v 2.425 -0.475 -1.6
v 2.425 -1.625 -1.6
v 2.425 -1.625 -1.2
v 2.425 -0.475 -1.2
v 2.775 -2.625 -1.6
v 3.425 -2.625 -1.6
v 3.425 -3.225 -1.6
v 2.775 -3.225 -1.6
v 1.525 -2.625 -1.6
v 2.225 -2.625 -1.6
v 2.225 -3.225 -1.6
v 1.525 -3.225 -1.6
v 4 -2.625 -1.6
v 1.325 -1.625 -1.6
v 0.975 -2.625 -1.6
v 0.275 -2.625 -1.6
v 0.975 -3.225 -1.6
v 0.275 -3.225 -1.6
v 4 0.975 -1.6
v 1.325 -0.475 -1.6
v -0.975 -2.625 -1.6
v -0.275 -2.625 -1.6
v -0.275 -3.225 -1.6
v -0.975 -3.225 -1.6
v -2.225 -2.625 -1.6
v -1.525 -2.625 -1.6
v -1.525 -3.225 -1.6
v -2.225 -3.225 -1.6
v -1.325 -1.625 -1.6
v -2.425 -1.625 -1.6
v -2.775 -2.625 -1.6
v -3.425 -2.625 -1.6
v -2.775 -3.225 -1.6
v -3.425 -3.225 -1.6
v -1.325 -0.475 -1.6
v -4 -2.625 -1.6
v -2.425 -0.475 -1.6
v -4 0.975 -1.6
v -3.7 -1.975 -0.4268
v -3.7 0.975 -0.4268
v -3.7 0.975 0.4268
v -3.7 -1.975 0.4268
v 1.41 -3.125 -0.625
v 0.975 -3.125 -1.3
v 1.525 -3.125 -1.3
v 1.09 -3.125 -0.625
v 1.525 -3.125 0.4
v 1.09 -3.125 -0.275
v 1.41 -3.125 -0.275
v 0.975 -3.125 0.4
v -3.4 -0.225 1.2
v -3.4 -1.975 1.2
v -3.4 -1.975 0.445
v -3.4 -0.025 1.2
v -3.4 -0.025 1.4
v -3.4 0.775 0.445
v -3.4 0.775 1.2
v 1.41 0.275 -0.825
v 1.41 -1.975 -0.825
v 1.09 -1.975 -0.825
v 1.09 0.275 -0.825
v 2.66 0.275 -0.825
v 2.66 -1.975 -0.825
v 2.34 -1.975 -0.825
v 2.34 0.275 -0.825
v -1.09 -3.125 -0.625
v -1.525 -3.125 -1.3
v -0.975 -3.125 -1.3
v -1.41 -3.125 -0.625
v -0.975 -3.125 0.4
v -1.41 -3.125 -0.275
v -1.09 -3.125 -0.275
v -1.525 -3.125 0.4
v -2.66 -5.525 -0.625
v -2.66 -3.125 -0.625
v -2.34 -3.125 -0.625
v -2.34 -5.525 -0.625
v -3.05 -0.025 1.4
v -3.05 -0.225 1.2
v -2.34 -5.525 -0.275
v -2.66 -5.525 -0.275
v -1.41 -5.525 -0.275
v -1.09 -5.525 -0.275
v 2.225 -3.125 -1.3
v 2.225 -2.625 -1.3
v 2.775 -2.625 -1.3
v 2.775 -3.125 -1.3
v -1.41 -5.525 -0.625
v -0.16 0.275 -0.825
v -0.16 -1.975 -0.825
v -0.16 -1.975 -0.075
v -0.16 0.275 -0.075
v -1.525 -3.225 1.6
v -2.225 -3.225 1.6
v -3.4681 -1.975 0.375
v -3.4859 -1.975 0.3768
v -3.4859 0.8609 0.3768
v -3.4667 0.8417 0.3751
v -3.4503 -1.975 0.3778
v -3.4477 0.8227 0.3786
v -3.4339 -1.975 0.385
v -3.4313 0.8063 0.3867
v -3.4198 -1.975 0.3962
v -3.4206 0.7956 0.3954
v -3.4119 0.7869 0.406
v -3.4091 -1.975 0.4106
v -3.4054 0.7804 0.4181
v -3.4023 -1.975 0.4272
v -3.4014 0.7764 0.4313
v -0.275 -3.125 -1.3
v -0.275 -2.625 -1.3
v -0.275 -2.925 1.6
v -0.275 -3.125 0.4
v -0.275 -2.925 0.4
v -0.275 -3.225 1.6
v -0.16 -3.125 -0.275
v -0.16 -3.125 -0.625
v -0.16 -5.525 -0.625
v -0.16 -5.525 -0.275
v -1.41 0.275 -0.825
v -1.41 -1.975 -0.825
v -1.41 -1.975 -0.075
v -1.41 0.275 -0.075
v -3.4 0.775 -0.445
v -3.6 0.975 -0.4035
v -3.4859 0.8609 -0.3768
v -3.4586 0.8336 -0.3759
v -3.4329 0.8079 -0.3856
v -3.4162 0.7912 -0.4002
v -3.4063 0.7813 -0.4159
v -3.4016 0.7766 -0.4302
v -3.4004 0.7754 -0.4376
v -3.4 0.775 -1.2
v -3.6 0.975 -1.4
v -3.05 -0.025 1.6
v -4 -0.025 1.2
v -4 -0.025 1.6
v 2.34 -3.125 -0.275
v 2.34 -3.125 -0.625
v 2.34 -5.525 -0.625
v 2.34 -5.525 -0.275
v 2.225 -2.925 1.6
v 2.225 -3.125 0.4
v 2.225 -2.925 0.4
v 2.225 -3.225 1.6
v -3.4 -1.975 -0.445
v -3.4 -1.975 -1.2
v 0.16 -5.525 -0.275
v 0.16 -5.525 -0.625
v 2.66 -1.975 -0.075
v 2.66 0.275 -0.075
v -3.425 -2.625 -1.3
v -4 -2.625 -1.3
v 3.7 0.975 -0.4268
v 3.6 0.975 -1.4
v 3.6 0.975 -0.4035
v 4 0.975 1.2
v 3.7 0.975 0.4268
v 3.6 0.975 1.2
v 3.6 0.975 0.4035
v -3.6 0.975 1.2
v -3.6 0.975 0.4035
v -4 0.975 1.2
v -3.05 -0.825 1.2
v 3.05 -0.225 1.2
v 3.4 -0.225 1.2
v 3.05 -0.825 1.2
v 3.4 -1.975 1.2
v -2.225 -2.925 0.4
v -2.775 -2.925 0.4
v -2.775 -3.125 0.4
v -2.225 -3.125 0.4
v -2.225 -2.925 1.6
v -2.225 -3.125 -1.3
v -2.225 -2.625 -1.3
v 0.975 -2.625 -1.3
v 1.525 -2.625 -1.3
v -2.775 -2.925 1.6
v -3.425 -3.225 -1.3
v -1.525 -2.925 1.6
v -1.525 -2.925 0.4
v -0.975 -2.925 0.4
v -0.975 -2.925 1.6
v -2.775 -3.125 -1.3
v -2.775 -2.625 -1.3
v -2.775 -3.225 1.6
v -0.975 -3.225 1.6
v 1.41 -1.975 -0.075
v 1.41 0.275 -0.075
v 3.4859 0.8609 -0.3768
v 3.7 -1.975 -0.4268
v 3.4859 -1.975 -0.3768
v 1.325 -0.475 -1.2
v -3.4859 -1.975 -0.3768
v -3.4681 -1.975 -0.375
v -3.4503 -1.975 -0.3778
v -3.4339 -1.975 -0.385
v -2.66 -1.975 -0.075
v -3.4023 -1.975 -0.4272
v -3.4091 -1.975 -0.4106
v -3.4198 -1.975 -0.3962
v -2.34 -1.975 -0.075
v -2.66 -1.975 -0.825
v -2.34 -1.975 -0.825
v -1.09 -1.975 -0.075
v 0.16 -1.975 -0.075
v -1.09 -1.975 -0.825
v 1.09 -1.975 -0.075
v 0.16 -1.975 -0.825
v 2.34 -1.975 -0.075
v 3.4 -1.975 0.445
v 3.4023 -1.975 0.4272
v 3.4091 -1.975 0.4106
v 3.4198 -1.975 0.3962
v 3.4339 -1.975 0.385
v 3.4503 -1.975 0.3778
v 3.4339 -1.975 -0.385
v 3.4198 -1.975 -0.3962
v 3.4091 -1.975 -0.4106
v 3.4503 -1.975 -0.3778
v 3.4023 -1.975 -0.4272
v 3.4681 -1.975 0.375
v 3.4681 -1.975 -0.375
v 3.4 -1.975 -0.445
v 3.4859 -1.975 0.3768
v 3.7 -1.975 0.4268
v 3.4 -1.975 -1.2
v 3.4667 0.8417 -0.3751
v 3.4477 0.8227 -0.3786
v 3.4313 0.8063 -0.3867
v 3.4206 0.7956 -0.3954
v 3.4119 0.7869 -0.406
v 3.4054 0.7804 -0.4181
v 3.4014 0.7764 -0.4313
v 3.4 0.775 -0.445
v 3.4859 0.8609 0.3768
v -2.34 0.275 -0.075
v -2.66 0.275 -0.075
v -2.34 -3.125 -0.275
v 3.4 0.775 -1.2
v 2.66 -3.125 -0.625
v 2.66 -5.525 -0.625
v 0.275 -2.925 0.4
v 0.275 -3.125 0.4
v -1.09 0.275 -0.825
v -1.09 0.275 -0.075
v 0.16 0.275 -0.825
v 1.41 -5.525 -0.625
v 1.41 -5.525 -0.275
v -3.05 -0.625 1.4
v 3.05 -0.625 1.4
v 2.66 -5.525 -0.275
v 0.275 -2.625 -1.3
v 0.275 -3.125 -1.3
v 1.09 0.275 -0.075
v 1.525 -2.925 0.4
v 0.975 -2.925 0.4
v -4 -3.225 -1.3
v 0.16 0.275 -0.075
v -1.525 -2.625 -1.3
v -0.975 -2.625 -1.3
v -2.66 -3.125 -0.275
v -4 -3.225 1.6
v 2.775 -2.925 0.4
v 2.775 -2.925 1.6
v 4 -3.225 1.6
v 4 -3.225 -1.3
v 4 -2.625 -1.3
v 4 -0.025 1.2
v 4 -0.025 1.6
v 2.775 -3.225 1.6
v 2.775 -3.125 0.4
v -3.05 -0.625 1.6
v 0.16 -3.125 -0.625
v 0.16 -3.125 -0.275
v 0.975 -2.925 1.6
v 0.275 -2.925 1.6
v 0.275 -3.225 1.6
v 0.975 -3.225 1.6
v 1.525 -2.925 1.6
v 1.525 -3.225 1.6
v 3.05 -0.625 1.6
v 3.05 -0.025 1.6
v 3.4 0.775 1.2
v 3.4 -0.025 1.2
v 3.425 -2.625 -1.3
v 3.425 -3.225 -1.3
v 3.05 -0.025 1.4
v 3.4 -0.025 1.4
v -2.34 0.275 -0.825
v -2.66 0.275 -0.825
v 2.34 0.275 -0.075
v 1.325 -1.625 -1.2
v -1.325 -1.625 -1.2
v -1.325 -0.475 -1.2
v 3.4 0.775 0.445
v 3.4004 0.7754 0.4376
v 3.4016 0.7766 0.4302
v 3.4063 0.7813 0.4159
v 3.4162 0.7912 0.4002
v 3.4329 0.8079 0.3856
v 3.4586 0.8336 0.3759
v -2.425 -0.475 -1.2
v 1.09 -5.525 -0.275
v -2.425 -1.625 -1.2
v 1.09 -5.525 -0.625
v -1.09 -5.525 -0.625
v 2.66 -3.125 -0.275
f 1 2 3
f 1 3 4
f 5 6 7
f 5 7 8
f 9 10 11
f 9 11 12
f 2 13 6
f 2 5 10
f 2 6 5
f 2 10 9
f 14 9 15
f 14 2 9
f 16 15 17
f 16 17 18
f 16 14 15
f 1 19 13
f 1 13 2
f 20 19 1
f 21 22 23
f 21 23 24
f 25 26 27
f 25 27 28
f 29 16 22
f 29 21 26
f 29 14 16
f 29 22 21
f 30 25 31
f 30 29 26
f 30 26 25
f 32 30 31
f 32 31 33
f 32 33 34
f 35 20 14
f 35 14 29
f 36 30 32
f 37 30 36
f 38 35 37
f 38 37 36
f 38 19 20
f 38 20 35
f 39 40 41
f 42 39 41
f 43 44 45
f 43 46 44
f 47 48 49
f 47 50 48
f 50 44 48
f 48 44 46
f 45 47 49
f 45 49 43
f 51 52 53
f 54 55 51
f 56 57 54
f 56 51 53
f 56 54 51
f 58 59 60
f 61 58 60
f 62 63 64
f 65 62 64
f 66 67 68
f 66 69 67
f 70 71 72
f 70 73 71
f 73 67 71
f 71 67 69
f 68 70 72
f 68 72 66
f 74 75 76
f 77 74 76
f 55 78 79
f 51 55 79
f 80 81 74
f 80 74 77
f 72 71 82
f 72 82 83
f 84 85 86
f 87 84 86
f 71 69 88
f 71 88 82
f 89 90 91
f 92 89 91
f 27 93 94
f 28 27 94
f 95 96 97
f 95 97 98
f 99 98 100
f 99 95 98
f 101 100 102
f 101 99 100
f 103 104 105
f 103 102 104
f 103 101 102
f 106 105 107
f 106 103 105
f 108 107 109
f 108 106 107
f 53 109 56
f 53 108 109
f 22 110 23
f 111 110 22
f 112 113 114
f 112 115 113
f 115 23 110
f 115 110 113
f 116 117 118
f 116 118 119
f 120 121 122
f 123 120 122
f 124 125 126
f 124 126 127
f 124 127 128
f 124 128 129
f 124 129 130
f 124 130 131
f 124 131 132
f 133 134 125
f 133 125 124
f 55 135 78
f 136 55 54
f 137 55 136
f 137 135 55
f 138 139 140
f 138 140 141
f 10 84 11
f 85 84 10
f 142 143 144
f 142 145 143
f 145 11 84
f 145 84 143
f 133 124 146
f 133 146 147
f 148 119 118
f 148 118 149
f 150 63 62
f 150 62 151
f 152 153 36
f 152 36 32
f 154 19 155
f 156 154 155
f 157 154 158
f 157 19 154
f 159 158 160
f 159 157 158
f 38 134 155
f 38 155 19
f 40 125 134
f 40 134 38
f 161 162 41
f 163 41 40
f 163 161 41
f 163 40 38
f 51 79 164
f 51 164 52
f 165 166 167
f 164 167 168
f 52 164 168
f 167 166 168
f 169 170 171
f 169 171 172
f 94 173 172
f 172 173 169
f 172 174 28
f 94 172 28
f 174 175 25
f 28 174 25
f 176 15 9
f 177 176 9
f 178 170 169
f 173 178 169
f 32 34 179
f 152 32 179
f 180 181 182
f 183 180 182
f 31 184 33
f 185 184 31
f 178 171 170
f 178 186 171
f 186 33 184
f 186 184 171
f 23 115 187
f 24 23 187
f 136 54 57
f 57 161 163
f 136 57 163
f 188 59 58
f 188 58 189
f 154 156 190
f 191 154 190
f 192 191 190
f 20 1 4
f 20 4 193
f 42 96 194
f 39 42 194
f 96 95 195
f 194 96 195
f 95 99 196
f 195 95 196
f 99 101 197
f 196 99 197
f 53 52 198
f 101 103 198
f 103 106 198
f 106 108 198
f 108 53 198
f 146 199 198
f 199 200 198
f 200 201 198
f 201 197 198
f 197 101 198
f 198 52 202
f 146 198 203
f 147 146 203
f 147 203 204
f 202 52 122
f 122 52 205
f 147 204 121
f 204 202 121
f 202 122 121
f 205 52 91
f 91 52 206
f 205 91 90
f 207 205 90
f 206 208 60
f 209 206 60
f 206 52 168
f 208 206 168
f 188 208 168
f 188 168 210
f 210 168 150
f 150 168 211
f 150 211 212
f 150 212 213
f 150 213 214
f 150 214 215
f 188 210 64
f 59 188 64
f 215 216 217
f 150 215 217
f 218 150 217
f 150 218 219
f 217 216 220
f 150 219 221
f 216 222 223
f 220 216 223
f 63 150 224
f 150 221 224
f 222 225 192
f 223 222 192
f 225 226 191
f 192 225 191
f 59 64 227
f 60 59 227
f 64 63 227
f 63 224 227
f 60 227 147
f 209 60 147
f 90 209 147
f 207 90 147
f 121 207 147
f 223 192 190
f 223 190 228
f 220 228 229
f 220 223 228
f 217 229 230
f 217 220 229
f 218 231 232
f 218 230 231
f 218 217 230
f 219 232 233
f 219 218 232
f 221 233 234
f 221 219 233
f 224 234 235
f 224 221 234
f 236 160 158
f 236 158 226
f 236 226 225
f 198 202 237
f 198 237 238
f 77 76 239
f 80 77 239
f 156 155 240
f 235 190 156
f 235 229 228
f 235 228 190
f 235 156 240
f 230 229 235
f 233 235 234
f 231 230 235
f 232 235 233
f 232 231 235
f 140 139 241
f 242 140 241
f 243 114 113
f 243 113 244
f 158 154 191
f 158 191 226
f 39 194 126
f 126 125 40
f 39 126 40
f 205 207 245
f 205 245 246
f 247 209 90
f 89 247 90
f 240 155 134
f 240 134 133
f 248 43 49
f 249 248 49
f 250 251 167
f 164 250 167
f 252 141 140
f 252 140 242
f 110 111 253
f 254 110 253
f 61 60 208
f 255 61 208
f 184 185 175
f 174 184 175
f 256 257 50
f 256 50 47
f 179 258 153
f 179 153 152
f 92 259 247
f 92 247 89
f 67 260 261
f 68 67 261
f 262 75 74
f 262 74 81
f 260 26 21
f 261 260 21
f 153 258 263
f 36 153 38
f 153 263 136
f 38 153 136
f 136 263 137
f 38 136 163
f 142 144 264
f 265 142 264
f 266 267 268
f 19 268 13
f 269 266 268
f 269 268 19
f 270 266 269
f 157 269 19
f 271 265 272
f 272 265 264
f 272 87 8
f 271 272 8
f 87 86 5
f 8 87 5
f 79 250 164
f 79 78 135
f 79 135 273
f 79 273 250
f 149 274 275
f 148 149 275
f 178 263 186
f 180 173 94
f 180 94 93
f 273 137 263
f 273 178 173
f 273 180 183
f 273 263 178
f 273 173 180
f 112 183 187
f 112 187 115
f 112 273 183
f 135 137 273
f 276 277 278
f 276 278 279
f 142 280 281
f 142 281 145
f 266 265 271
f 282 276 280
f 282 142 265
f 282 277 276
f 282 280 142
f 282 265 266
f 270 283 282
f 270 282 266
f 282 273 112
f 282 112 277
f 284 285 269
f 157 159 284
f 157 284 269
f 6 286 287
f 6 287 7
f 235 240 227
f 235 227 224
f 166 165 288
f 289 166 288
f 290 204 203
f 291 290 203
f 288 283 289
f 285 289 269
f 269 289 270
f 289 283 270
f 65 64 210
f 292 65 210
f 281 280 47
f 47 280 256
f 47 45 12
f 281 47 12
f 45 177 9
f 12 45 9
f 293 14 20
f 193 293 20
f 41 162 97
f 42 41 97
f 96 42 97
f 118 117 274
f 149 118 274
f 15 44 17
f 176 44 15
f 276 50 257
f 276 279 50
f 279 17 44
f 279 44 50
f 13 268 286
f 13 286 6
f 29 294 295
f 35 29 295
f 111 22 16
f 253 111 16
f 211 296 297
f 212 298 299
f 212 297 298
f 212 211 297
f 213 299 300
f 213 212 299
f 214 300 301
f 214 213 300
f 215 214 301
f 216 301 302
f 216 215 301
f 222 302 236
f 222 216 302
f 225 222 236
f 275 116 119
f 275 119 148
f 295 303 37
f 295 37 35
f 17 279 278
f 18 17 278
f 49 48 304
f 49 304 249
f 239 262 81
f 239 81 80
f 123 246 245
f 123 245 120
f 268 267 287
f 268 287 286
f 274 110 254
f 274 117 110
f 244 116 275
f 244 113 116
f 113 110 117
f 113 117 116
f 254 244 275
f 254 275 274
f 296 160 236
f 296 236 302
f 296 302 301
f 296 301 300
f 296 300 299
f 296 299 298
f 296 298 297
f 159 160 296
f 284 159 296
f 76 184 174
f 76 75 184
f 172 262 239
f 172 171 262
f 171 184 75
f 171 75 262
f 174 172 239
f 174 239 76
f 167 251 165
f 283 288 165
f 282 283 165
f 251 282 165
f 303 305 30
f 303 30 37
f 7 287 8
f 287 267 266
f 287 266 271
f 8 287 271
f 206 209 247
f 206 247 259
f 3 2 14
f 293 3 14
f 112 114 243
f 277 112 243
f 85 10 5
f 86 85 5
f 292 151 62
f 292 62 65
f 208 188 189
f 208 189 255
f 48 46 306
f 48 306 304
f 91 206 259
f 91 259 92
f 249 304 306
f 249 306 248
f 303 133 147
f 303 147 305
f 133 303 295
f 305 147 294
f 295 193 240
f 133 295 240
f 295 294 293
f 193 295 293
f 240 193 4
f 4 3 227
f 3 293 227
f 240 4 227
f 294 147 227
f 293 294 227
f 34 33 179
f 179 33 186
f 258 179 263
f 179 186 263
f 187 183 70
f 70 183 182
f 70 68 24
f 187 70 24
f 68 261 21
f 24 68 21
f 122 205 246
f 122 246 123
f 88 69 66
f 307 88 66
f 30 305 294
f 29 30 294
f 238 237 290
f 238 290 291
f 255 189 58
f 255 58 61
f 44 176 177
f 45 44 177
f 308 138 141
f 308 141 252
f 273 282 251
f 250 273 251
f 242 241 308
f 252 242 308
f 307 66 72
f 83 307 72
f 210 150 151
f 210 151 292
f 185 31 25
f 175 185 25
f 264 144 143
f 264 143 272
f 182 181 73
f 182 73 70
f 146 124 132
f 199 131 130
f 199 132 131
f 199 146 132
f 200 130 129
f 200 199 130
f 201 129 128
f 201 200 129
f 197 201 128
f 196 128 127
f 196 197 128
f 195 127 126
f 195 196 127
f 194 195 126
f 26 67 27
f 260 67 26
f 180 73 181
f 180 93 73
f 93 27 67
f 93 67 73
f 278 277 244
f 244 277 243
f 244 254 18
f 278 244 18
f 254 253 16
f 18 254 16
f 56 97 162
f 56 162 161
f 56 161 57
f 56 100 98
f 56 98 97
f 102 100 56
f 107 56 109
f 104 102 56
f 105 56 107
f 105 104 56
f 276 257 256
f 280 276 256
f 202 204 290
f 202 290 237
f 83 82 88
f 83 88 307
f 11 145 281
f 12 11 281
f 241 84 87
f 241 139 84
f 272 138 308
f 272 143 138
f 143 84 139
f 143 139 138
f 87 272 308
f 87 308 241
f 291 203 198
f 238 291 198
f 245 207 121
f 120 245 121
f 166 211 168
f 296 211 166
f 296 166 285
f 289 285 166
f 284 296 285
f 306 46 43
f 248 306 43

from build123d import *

# Parameters (mm, degrees)
SKETCH1_W            = 8
SKETCH1_H            = 4.2
BOSS_EXTRUDE1_DEPTH  = 2.8
CUT_EXTRUDE1_DEPTH   = 6.1
SKETCH3_W            = 0.95
SKETCH3_H            = 1
CUT_EXTRUDE2_DEPTH   = 0.4
CUT_EXTRUDE3_DEPTH   = 1
CUT_EXTRUDE4_DEPTH   = 0.35
CUT_EXTRUDE5_DEPTH   = 0.35
SKETCH7_W            = 8
SKETCH7_H            = 4.2
BOSS_EXTRUDE2_DEPTH  = 0.4
SKETCH8_W            = 0.55
SKETCH8_H            = 0.1
CUT_EXTRUDE6_DEPTH   = 3.2
CUT_EXTRUDE7_REACH   = 7.811
SKETCH10_W           = 0.55
SKETCH10_H           = 1.2
SKETCH11_W           = 0.55
SKETCH11_H           = 0.1
CUT_EXTRUDE8_DEPTH   = 3.2
CUT_EXTRUDE9_REACH   = 7.811
SKETCH13_W           = 0.55
SKETCH13_H           = 1.2
SKETCH14_W           = 0.55
SKETCH14_H           = 0.1
CUT_EXTRUDE10_DEPTH  = 3.2
CUT_EXTRUDE11_REACH  = 7.811
SKETCH16_W           = 0.55
SKETCH16_H           = 1.2
SKETCH17_W           = 0.55
SKETCH17_H           = 0.1
CUT_EXTRUDE12_DEPTH  = 3.2
CUT_EXTRUDE13_REACH  = 7.811
SKETCH19_W           = 0.55
SKETCH19_H           = 1.2
SKETCH20_W           = 0.55
SKETCH20_H           = 0.1
CUT_EXTRUDE14_DEPTH  = 3.2
CUT_EXTRUDE15_REACH  = 7.811
SKETCH22_W           = 0.55
SKETCH22_H           = 1.2
CUT_EXTRUDE16_REACH  = 7.614
SKETCH24_W           = 0.55
SKETCH24_H           = 0.3
CUT_EXTRUDE17_REACH  = 7.614
SKETCH26_W           = 0.55
SKETCH26_H           = 0.3
CUT_EXTRUDE18_REACH  = 7.614
SKETCH28_W           = 0.55
SKETCH28_H           = 0.3
CUT_EXTRUDE19_REACH  = 7.614
SKETCH30_W           = 0.55
SKETCH30_H           = 0.3
CUT_EXTRUDE20_REACH  = 7.614
SKETCH32_W           = 0.55
SKETCH32_H           = 0.3
CUT_EXTRUDE21_DEPTH  = 2.95
SKETCH34_W           = 0.3
SKETCH34_H           = 0.853669018
CUT_EXTRUDE22_DEPTH  = 2.95
SKETCH35_W           = 1.1
SKETCH35_H           = 1.15
CUT_EXTRUDE23_DEPTH  = 6.85154894
CUT_EXTRUDE24_REACH  = 8.053
SKETCH36_W           = 1.1
SKETCH36_H           = 1.15
SKETCH37_W           = 0.575
SKETCH37_H           = 0.3
CUT_EXTRUDE25_DEPTH  = 0.6
SKETCH38_W           = 0.3
SKETCH38_H           = 0.6
CUT_EXTRUDE26_DEPTH  = 0.575
SKETCH39_W           = 0.32
SKETCH39_H           = 0.35
BOSS_EXTRUDE3_DEPTH  = 2.4
SKETCH40_W           = 0.32
SKETCH40_H           = 0.35
BOSS_EXTRUDE4_DEPTH  = 2.4
SKETCH41_W           = 0.32
SKETCH41_H           = 0.35
BOSS_EXTRUDE5_DEPTH  = 2.4
SKETCH42_W           = 0.32
SKETCH42_H           = 0.35
BOSS_EXTRUDE6_DEPTH  = 2.4
SKETCH43_W           = 0.32
SKETCH43_H           = 0.35
BOSS_EXTRUDE7_DEPTH  = 2.4
SKETCH44_W           = 0.32
SKETCH44_H           = 0.75
BOSS_EXTRUDE8_DEPTH  = 2.25
SKETCH45_W           = 0.32
SKETCH45_H           = 0.75
BOSS_EXTRUDE9_DEPTH  = 2.25
SKETCH46_W           = 0.32
SKETCH46_H           = 0.75
BOSS_EXTRUDE10_DEPTH = 2.25
SKETCH47_W           = 0.32
SKETCH47_H           = 0.75
BOSS_EXTRUDE11_DEPTH = 2.25
SKETCH48_W           = 0.32
SKETCH48_H           = 0.75
BOSS_EXTRUDE12_DEPTH = 2.25
DRAFT1_ANGLE         = -13.146241157
DRAFT2_ANGLE         = -13.146241157
FILLET1_R            = 0.07
CHAMFER1_SIZE        = 0.2


with BuildPart() as part:
    # Sketch1 → Boss-Extrude1 (new body)
    with BuildSketch(Plane.XY.offset(1.6)):
        with Locations((0, -1.125)):
            Rectangle(SKETCH1_W, SKETCH1_H)
    extrude(amount=-BOSS_EXTRUDE1_DEPTH)

    # Sketch2 → Cut-Extrude1 (cut)
    with BuildSketch(Plane(origin=(3.05, 0, 0), x_dir=(0, 0, -1), z_dir=(1, 0, 0))):
        Polygon((1.2, 0.975), (-1.6, 0.975), (-1.6, -0.625), (-1.4, -0.625), (-1.2, -0.825), (-1.2, -1.975), (1.2, -1.975), align=None)
    extrude(amount=-CUT_EXTRUDE1_DEPTH, mode=Mode.SUBTRACT)

    # Sketch3 → Cut-Extrude2 (cut)
    with BuildSketch(Plane.XY.offset(1.6)):
        with Locations((3.525, 0.475)):
            Rectangle(SKETCH3_W, SKETCH3_H)
    extrude(amount=-CUT_EXTRUDE2_DEPTH, mode=Mode.SUBTRACT)

    # Sketch4 → Cut-Extrude3 (cut)
    with BuildSketch(Plane(origin=(0, 0.975, 0), x_dir=(-1, 0, 0), z_dir=(0, 1, 0))):
        with BuildLine():
            Line((3.05, 1.6), (3.05, 1.2))
            add(Edge.make_bspline(
                [(3.05, 1.2), (3.166666667, 1.2), (3.283333333, 1.2), (3.4, 1.2)],
                knots=[0, 0, 0, 0, 1, 1, 1, 1], degree=3))
            Line((3.4, 1.2), (4, 1.2))
            Line((4, 1.2), (4, 1.6))
            Line((4, 1.6), (3.05, 1.6))
        make_face()
    extrude(amount=-CUT_EXTRUDE3_DEPTH, mode=Mode.SUBTRACT)

    # Sketch5 → Cut-Extrude4 (cut)
    with BuildSketch(Plane.ZY.offset(-3.05)):
        Polygon((-1.2, -1.975), (1.2, -1.975), (1.2, -0.225), (1.4, -0.025), (1.2, -0.025), (1.2, 0.975), (-1.2, 0.975), align=None)
    extrude(amount=-CUT_EXTRUDE4_DEPTH, mode=Mode.SUBTRACT)

    # Sketch6 → Cut-Extrude5 (cut)
    with BuildSketch(Plane(origin=(-3.05, 0, 0), x_dir=(0, 0, -1), z_dir=(1, 0, 0))):
        Polygon((1.2, -1.975), (1.2, 0.975), (-1.2, 0.975), (-1.2, -0.025), (-1.4, -0.025), (-1.2, -0.225), (-1.2, -1.975), align=None)
    extrude(amount=-CUT_EXTRUDE5_DEPTH, mode=Mode.SUBTRACT)

    # Sketch7 → Boss-Extrude2 (add)
    with BuildSketch(Plane(origin=(0, 0, -1.2), x_dir=(-1, 0, 0), z_dir=(0, 0, -1))):
        with Locations((0, -1.125)):
            Rectangle(SKETCH7_W, SKETCH7_H)
    extrude(amount=BOSS_EXTRUDE2_DEPTH)

    # Sketch8 → Cut-Extrude6 (cut)
    with BuildSketch(Plane.XY.offset(1.6)):
        with Locations((-1.25, -3.175)):
            Rectangle(SKETCH8_W, SKETCH8_H)
    extrude(amount=-CUT_EXTRUDE6_DEPTH, mode=Mode.SUBTRACT)

    # Sketch10 → Cut-Extrude7 (cut, up to next)
    with BuildSketch(Plane(origin=(0, -2.925, 0), x_dir=(1, 0, 0), z_dir=(0, 1, 0)), mode=Mode.PRIVATE) as cut_extrude7_sk1:
        with Locations((-1.25, -1)):
            Rectangle(SKETCH10_W, SKETCH10_H)
    cut_extrude7_tool1 = extrude(cut_extrude7_sk1.sketch, amount=-CUT_EXTRUDE7_REACH, mode=Mode.PRIVATE) & part.part
    add(cut_extrude7_tool1.solids().sort_by_distance((-1.25, -2.925, 1))[0], mode=Mode.SUBTRACT)

    # Sketch11 → Cut-Extrude8 (cut)
    with BuildSketch(Plane.XY.offset(1.6)):
        with Locations((0, -3.175)):
            Rectangle(SKETCH11_W, SKETCH11_H)
    extrude(amount=-CUT_EXTRUDE8_DEPTH, mode=Mode.SUBTRACT)

    # Sketch13 → Cut-Extrude9 (cut, up to next)
    with BuildSketch(Plane(origin=(0, -2.925, 0), x_dir=(1, 0, 0), z_dir=(0, 1, 0)), mode=Mode.PRIVATE) as cut_extrude9_sk1:
        with Locations((0, -1)):
            Rectangle(SKETCH13_W, SKETCH13_H)
    cut_extrude9_tool1 = extrude(cut_extrude9_sk1.sketch, amount=-CUT_EXTRUDE9_REACH, mode=Mode.PRIVATE) & part.part
    add(cut_extrude9_tool1.solids().sort_by_distance((0, -2.925, 1))[0], mode=Mode.SUBTRACT)

    # Sketch14 → Cut-Extrude10 (cut)
    with BuildSketch(Plane.XY.offset(1.6)):
        with Locations((1.25, -3.175)):
            Rectangle(SKETCH14_W, SKETCH14_H)
    extrude(amount=-CUT_EXTRUDE10_DEPTH, mode=Mode.SUBTRACT)

    # Sketch16 → Cut-Extrude11 (cut, up to next)
    with BuildSketch(Plane(origin=(0, -2.925, 0), x_dir=(1, 0, 0), z_dir=(0, 1, 0)), mode=Mode.PRIVATE) as cut_extrude11_sk1:
        with Locations((1.25, -1)):
            Rectangle(SKETCH16_W, SKETCH16_H)
    cut_extrude11_tool1 = extrude(cut_extrude11_sk1.sketch, amount=-CUT_EXTRUDE11_REACH, mode=Mode.PRIVATE) & part.part
    add(cut_extrude11_tool1.solids().sort_by_distance((1.25, -2.925, 1))[0], mode=Mode.SUBTRACT)

    # Sketch17 → Cut-Extrude12 (cut)
    with BuildSketch(Plane.XY.offset(1.6)):
        with Locations((2.5, -3.175)):
            Rectangle(SKETCH17_W, SKETCH17_H)
    extrude(amount=-CUT_EXTRUDE12_DEPTH, mode=Mode.SUBTRACT)

    # Sketch19 → Cut-Extrude13 (cut, up to next)
    with BuildSketch(Plane(origin=(0, -2.925, 0), x_dir=(1, 0, 0), z_dir=(0, 1, 0)), mode=Mode.PRIVATE) as cut_extrude13_sk1:
        with Locations((2.5, -1)):
            Rectangle(SKETCH19_W, SKETCH19_H)
    cut_extrude13_tool1 = extrude(cut_extrude13_sk1.sketch, amount=-CUT_EXTRUDE13_REACH, mode=Mode.PRIVATE) & part.part
    add(cut_extrude13_tool1.solids().sort_by_distance((2.5, -2.925, 1))[0], mode=Mode.SUBTRACT)

    # Sketch20 → Cut-Extrude14 (cut)
    with BuildSketch(Plane.XY.offset(1.6)):
        with Locations((-2.5, -3.175)):
            Rectangle(SKETCH20_W, SKETCH20_H)
    extrude(amount=-CUT_EXTRUDE14_DEPTH, mode=Mode.SUBTRACT)

    # Sketch22 → Cut-Extrude15 (cut, up to next)
    with BuildSketch(Plane(origin=(0, -2.925, 0), x_dir=(1, 0, 0), z_dir=(0, 1, 0)), mode=Mode.PRIVATE) as cut_extrude15_sk1:
        with Locations((-2.5, -1)):
            Rectangle(SKETCH22_W, SKETCH22_H)
    cut_extrude15_tool1 = extrude(cut_extrude15_sk1.sketch, amount=-CUT_EXTRUDE15_REACH, mode=Mode.PRIVATE) & part.part
    add(cut_extrude15_tool1.solids().sort_by_distance((-2.5, -2.925, 1))[0], mode=Mode.SUBTRACT)

    # Sketch24 → Cut-Extrude16 (cut, up to next)
    with BuildSketch(Plane(origin=(0, -2.625, 0), x_dir=(1, 0, 0), z_dir=(0, 1, 0)), mode=Mode.PRIVATE) as cut_extrude16_sk1:
        with Locations((-2.5, 1.45)):
            Rectangle(SKETCH24_W, SKETCH24_H)
    cut_extrude16_tool1 = extrude(cut_extrude16_sk1.sketch, amount=-CUT_EXTRUDE16_REACH, mode=Mode.PRIVATE) & part.part
    add(cut_extrude16_tool1.solids().sort_by_distance((-2.5, -2.625, -1.45))[0], mode=Mode.SUBTRACT)

    # Sketch26 → Cut-Extrude17 (cut, up to next)
    with BuildSketch(Plane(origin=(0, -2.625, 0), x_dir=(1, 0, 0), z_dir=(0, 1, 0)), mode=Mode.PRIVATE) as cut_extrude17_sk1:
        with Locations((2.5, 1.45)):
            Rectangle(SKETCH26_W, SKETCH26_H)
    cut_extrude17_tool1 = extrude(cut_extrude17_sk1.sketch, amount=-CUT_EXTRUDE17_REACH, mode=Mode.PRIVATE) & part.part
    add(cut_extrude17_tool1.solids().sort_by_distance((2.5, -2.625, -1.45))[0], mode=Mode.SUBTRACT)

    # Sketch28 → Cut-Extrude18 (cut, up to next)
    with BuildSketch(Plane(origin=(0, -2.625, 0), x_dir=(1, 0, 0), z_dir=(0, 1, 0)), mode=Mode.PRIVATE) as cut_extrude18_sk1:
        with Locations((1.25, 1.45)):
            Rectangle(SKETCH28_W, SKETCH28_H)
    cut_extrude18_tool1 = extrude(cut_extrude18_sk1.sketch, amount=-CUT_EXTRUDE18_REACH, mode=Mode.PRIVATE) & part.part
    add(cut_extrude18_tool1.solids().sort_by_distance((1.25, -2.625, -1.45))[0], mode=Mode.SUBTRACT)

    # Sketch30 → Cut-Extrude19 (cut, up to next)
    with BuildSketch(Plane(origin=(0, -2.625, 0), x_dir=(1, 0, 0), z_dir=(0, 1, 0)), mode=Mode.PRIVATE) as cut_extrude19_sk1:
        with Locations((0, 1.45)):
            Rectangle(SKETCH30_W, SKETCH30_H)
    cut_extrude19_tool1 = extrude(cut_extrude19_sk1.sketch, amount=-CUT_EXTRUDE19_REACH, mode=Mode.PRIVATE) & part.part
    add(cut_extrude19_tool1.solids().sort_by_distance((0, -2.625, -1.45))[0], mode=Mode.SUBTRACT)

    # Sketch32 → Cut-Extrude20 (cut, up to next)
    with BuildSketch(Plane(origin=(0, -2.625, 0), x_dir=(1, 0, 0), z_dir=(0, 1, 0)), mode=Mode.PRIVATE) as cut_extrude20_sk1:
        with Locations((-1.25, 1.45)):
            Rectangle(SKETCH32_W, SKETCH32_H)
    cut_extrude20_tool1 = extrude(cut_extrude20_sk1.sketch, amount=-CUT_EXTRUDE20_REACH, mode=Mode.PRIVATE) & part.part
    add(cut_extrude20_tool1.solids().sort_by_distance((-1.25, -2.625, -1.45))[0], mode=Mode.SUBTRACT)

    # Sketch33 → Cut-Extrude21 (cut)
    with BuildSketch(Plane(origin=(0, 0.975, 0), x_dir=(-1, 0, 0), z_dir=(0, 1, 0))):
        Polygon((3.7, -0.356767045), (3.7, 0.426834509), (3.4, 0.356767045), (3.4, -0.356767045), align=None)
    extrude(amount=-CUT_EXTRUDE21_DEPTH, mode=Mode.SUBTRACT)

    # Sketch34 → Cut-Extrude22 (cut)
    with BuildSketch(Plane(origin=(0, 0.975, 0), x_dir=(-1, 0, 0), z_dir=(0, 1, 0))):
        with Locations((-3.55, 0)):
            Rectangle(SKETCH34_W, SKETCH34_H)
    extrude(amount=-CUT_EXTRUDE22_DEPTH, mode=Mode.SUBTRACT)

    # Sketch35 → Cut-Extrude23 (cut, through all)
    with BuildSketch(Plane.XY.offset(-1.2)):
        with Locations((-1.875, -1.05)):
            Rectangle(SKETCH35_W, SKETCH35_H)
    extrude(amount=-CUT_EXTRUDE23_DEPTH, mode=Mode.SUBTRACT)

    # Sketch36 → Cut-Extrude24 (cut, up to next)
    with BuildSketch(Plane(origin=(0, 0, -1.6), x_dir=(-1, 0, 0), z_dir=(0, 0, -1)), mode=Mode.PRIVATE) as cut_extrude24_sk1:
        with Locations((-1.875, -1.05)):
            Rectangle(SKETCH36_W, SKETCH36_H)
    cut_extrude24_tool1 = extrude(cut_extrude24_sk1.sketch, amount=-CUT_EXTRUDE24_REACH, mode=Mode.PRIVATE) & part.part
    add(cut_extrude24_tool1.solids().sort_by_distance((1.875, -1.05, -1.6))[0], mode=Mode.SUBTRACT)

    # Sketch37 → Cut-Extrude25 (cut)
    with BuildSketch(Plane.XZ.offset(3.225)):
        with Locations((-3.7125, -1.45)):
            Rectangle(SKETCH37_W, SKETCH37_H)
    extrude(amount=-CUT_EXTRUDE25_DEPTH, mode=Mode.SUBTRACT)

    # Sketch38 → Cut-Extrude26 (cut)
    with BuildSketch(Plane(origin=(4, 0, 0), x_dir=(0, 0, -1), z_dir=(1, 0, 0))):
        with Locations((1.45, -2.925)):
            Rectangle(SKETCH38_W, SKETCH38_H)
    extrude(amount=-CUT_EXTRUDE26_DEPTH, mode=Mode.SUBTRACT)

    # Sketch39 → Boss-Extrude3 (add)
    with BuildSketch(Plane.XZ.offset(3.125)):
        with Locations((1.25, -0.45)):
            Rectangle(SKETCH39_W, SKETCH39_H)
    extrude(amount=BOSS_EXTRUDE3_DEPTH)

    # Sketch40 → Boss-Extrude4 (add)
    with BuildSketch(Plane.XZ.offset(3.125)):
        with Locations((0, -0.45)):
            Rectangle(SKETCH40_W, SKETCH40_H)
    extrude(amount=BOSS_EXTRUDE4_DEPTH)

    # Sketch41 → Boss-Extrude5 (add)
    with BuildSketch(Plane.XZ.offset(3.125)):
        with Locations((-1.25, -0.45)):
            Rectangle(SKETCH41_W, SKETCH41_H)
    extrude(amount=BOSS_EXTRUDE5_DEPTH)

    # Sketch42 → Boss-Extrude6 (add)
    with BuildSketch(Plane.XZ.offset(3.125)):
        with Locations((-2.5, -0.45)):
            Rectangle(SKETCH42_W, SKETCH42_H)
    extrude(amount=BOSS_EXTRUDE6_DEPTH)

    # Sketch43 → Boss-Extrude7 (add)
    with BuildSketch(Plane.XZ.offset(3.125)):
        with Locations((2.5, -0.45)):
            Rectangle(SKETCH43_W, SKETCH43_H)
    extrude(amount=BOSS_EXTRUDE7_DEPTH)

    # Sketch44 → Boss-Extrude8 (add)
    with BuildSketch(Plane(origin=(0, -1.975, 0), x_dir=(-1, 0, 0), z_dir=(0, 1, 0))):
        with Locations((-2.5, -0.45)):
            Rectangle(SKETCH44_W, SKETCH44_H)
    extrude(amount=BOSS_EXTRUDE8_DEPTH)

    # Sketch45 → Boss-Extrude9 (add)
    with BuildSketch(Plane(origin=(0, -1.975, 0), x_dir=(-1, 0, 0), z_dir=(0, 1, 0))):
        with Locations((-1.25, -0.45)):
            Rectangle(SKETCH45_W, SKETCH45_H)
    extrude(amount=BOSS_EXTRUDE9_DEPTH)

    # Sketch46 → Boss-Extrude10 (add)
    with BuildSketch(Plane(origin=(0, -1.975, 0), x_dir=(-1, 0, 0), z_dir=(0, 1, 0))):
        with Locations((0, -0.45)):
            Rectangle(SKETCH46_W, SKETCH46_H)
    extrude(amount=BOSS_EXTRUDE10_DEPTH)

    # Sketch47 → Boss-Extrude11 (add)
    with BuildSketch(Plane(origin=(0, -1.975, 0), x_dir=(-1, 0, 0), z_dir=(0, 1, 0))):
        with Locations((1.25, -0.45)):
            Rectangle(SKETCH47_W, SKETCH47_H)
    extrude(amount=BOSS_EXTRUDE11_DEPTH)

    # Sketch48 → Boss-Extrude12 (add)
    with BuildSketch(Plane(origin=(0, -1.975, 0), x_dir=(-1, 0, 0), z_dir=(0, 1, 0))):
        with Locations((2.5, -0.45)):
            Rectangle(SKETCH48_W, SKETCH48_H)
    extrude(amount=BOSS_EXTRUDE12_DEPTH)

    # Draft1
    draft1_faces = [part.faces().sort_by_distance(p)[0] for p in [
        (-3.55, -0.5, -0.356767045),
    ]]
    draft(draft1_faces, Plane(origin=(-3.4, 0, 0), x_dir=(0, 0, 1), z_dir=(1, 0, 0)), DRAFT1_ANGLE)

    # Draft2
    draft2_faces = [part.faces().sort_by_distance(p)[0] for p in [
        (3.55, -0.5, -0.426834509),
        (3.55, -0.5, 0.426834509),
    ]]
    draft(draft2_faces, Plane(origin=(3.7, -1.975, 0.426834509), x_dir=(0, 0, -1), z_dir=(-1, 0, 0)), DRAFT2_ANGLE)

    # Fillet1
    fillet1_edges = [part.edges().sort_by_distance(p)[0] for p in [
        (-3.4, -0.5, -0.356767045),
        (-3.4, -0.5, 0.356767045),
        (3.4, -0.5, -0.356767045),
        (3.4, -0.5, 0.356767045),
    ]]
    fillet(fillet1_edges, radius=FILLET1_R)

    # Chamfer1
    # the kernel refuses this chamfer: 0.2 mm, written as the material it takes off along each edge
    with BuildSketch(Plane(origin=(3.4, 0.975, 1.714336598), x_dir=(0.9996219169112966, 0.02749587661058616, 0), z_dir=(0, 0, -1)), Plane(origin=(-3.4, 0.975, -0.069336598), x_dir=(-0.9996219169112968, 0.027495876610586105, 0), z_dir=(0, 0, 1))) as chamfer1_piece_1:
        Polygon((CHAMFER1_SIZE * 0.999621916911, CHAMFER1_SIZE * 0.0274958766106), (-CHAMFER1_SIZE * 0.0274958766106, CHAMFER1_SIZE * 0.999621916911), (0, 0), align=None)
    extrude(amount=1.783673195, mode=Mode.SUBTRACT)
    with BuildSketch(Plane(origin=(3.4, 0.975, 0.069336598), x_dir=(0.9996219169112966, 0.02749587661058616, 0), z_dir=(0, 0, -1)), Plane(origin=(-3.4, 0.975, -1.2), x_dir=(-0.9996219169112966, 0.02749587661058616, 0), z_dir=(0, 0, 1))) as chamfer1_piece_2:
        Polygon((CHAMFER1_SIZE * 0.999621916911, CHAMFER1_SIZE * 0.0274958766106), (-CHAMFER1_SIZE * 0.0274958766106, CHAMFER1_SIZE * 0.999621916911), (0, 0), align=None)
    extrude(amount=1.269336598, mode=Mode.SUBTRACT)
    with BuildSketch(Plane(origin=(3.4, 0.975, -1.2), x_dir=(0, 0.027495876610586223, -0.9996219169112966), z_dir=(-1, 0, 0))) as chamfer1_piece_3:
        Polygon((CHAMFER1_SIZE * 0.999621916911, CHAMFER1_SIZE * 0.0274958766106), (-CHAMFER1_SIZE * 0.0274958766106, CHAMFER1_SIZE * 0.999621916911), (0, 0), align=None)
    extrude(amount=6.8, mode=Mode.SUBTRACT)
    with BuildSketch(Plane(origin=(3.4, 0.975, 0.069336598), x_dir=(0.9996219169112966, 0.02749587661058616, 0), z_dir=(0, 0, -1))) as chamfer1_piece_4a_section:
        Polygon((CHAMFER1_SIZE * 0.999621916911, CHAMFER1_SIZE * 0.0274958766106), (-CHAMFER1_SIZE * 0.0274958766106, CHAMFER1_SIZE * 0.999621916911), (0, 0), align=None)
    chamfer1_piece_4a = extrude(amount=1.783673195, mode=Mode.PRIVATE)
    chamfer1_piece_4a = split(chamfer1_piece_4a, bisect_by=Plane(origin=(3.465958725, 0.909041275, -1.2), z_dir=(0, 0, -1)), keep=Keep.TOP, mode=Mode.PRIVATE)
    with BuildSketch(Plane(origin=(3.914336598, 0.975, -1.2), x_dir=(0, 0.02749587661058619, -0.9996219169112966), z_dir=(-1, 0, 0))) as chamfer1_piece_4b_section:
        Polygon((CHAMFER1_SIZE * 0.999621916911, CHAMFER1_SIZE * 0.0274958766106), (-CHAMFER1_SIZE * 0.0274958766106, CHAMFER1_SIZE * 0.999621916911), (0, 0), align=None)
    chamfer1_piece_4b = extrude(amount=7.314336598, mode=Mode.PRIVATE)
    chamfer1_piece_4b = split(chamfer1_piece_4b, bisect_by=Plane(origin=(3.4, 0.909041275, -1.265958725), z_dir=(1, 0, 0)), keep=Keep.TOP, mode=Mode.PRIVATE)
    chamfer1_piece_4 = chamfer1_piece_4a & chamfer1_piece_4b
    add(chamfer1_piece_4, mode=Mode.SUBTRACT)
    with BuildSketch(Plane(origin=(3.4, 0.975, -1.2), x_dir=(0, 0.027495876610586223, -0.9996219169112966), z_dir=(-1, 0, 0))) as chamfer1_piece_5a_section:
        Polygon((CHAMFER1_SIZE * 0.999621916911, CHAMFER1_SIZE * 0.0274958766106), (-CHAMFER1_SIZE * 0.0274958766106, CHAMFER1_SIZE * 0.999621916911), (0, 0), align=None)
    chamfer1_piece_5a = extrude(amount=7.314336598, mode=Mode.PRIVATE)
    chamfer1_piece_5a = split(chamfer1_piece_5a, bisect_by=Plane(origin=(-3.4, 0.909041275, -1.265958725), z_dir=(-1, 0, 0)), keep=Keep.TOP, mode=Mode.PRIVATE)
    with BuildSketch(Plane(origin=(-3.4, 0.975, -1.714336598), x_dir=(-0.9996219169112968, 0.027495876610586105, 0), z_dir=(0, 0, 1))) as chamfer1_piece_5b_section:
        Polygon((CHAMFER1_SIZE * 0.999621916911, CHAMFER1_SIZE * 0.0274958766106), (-CHAMFER1_SIZE * 0.0274958766106, CHAMFER1_SIZE * 0.999621916911), (0, 0), align=None)
    chamfer1_piece_5b = extrude(amount=1.783673195, mode=Mode.PRIVATE)
    chamfer1_piece_5b = split(chamfer1_piece_5b, bisect_by=Plane(origin=(-3.465958725, 0.909041275, -1.2), z_dir=(0, 0, -1)), keep=Keep.TOP, mode=Mode.PRIVATE)
    chamfer1_piece_5 = chamfer1_piece_5a & chamfer1_piece_5b
    add(chamfer1_piece_5, mode=Mode.SUBTRACT)


solid = part.part
